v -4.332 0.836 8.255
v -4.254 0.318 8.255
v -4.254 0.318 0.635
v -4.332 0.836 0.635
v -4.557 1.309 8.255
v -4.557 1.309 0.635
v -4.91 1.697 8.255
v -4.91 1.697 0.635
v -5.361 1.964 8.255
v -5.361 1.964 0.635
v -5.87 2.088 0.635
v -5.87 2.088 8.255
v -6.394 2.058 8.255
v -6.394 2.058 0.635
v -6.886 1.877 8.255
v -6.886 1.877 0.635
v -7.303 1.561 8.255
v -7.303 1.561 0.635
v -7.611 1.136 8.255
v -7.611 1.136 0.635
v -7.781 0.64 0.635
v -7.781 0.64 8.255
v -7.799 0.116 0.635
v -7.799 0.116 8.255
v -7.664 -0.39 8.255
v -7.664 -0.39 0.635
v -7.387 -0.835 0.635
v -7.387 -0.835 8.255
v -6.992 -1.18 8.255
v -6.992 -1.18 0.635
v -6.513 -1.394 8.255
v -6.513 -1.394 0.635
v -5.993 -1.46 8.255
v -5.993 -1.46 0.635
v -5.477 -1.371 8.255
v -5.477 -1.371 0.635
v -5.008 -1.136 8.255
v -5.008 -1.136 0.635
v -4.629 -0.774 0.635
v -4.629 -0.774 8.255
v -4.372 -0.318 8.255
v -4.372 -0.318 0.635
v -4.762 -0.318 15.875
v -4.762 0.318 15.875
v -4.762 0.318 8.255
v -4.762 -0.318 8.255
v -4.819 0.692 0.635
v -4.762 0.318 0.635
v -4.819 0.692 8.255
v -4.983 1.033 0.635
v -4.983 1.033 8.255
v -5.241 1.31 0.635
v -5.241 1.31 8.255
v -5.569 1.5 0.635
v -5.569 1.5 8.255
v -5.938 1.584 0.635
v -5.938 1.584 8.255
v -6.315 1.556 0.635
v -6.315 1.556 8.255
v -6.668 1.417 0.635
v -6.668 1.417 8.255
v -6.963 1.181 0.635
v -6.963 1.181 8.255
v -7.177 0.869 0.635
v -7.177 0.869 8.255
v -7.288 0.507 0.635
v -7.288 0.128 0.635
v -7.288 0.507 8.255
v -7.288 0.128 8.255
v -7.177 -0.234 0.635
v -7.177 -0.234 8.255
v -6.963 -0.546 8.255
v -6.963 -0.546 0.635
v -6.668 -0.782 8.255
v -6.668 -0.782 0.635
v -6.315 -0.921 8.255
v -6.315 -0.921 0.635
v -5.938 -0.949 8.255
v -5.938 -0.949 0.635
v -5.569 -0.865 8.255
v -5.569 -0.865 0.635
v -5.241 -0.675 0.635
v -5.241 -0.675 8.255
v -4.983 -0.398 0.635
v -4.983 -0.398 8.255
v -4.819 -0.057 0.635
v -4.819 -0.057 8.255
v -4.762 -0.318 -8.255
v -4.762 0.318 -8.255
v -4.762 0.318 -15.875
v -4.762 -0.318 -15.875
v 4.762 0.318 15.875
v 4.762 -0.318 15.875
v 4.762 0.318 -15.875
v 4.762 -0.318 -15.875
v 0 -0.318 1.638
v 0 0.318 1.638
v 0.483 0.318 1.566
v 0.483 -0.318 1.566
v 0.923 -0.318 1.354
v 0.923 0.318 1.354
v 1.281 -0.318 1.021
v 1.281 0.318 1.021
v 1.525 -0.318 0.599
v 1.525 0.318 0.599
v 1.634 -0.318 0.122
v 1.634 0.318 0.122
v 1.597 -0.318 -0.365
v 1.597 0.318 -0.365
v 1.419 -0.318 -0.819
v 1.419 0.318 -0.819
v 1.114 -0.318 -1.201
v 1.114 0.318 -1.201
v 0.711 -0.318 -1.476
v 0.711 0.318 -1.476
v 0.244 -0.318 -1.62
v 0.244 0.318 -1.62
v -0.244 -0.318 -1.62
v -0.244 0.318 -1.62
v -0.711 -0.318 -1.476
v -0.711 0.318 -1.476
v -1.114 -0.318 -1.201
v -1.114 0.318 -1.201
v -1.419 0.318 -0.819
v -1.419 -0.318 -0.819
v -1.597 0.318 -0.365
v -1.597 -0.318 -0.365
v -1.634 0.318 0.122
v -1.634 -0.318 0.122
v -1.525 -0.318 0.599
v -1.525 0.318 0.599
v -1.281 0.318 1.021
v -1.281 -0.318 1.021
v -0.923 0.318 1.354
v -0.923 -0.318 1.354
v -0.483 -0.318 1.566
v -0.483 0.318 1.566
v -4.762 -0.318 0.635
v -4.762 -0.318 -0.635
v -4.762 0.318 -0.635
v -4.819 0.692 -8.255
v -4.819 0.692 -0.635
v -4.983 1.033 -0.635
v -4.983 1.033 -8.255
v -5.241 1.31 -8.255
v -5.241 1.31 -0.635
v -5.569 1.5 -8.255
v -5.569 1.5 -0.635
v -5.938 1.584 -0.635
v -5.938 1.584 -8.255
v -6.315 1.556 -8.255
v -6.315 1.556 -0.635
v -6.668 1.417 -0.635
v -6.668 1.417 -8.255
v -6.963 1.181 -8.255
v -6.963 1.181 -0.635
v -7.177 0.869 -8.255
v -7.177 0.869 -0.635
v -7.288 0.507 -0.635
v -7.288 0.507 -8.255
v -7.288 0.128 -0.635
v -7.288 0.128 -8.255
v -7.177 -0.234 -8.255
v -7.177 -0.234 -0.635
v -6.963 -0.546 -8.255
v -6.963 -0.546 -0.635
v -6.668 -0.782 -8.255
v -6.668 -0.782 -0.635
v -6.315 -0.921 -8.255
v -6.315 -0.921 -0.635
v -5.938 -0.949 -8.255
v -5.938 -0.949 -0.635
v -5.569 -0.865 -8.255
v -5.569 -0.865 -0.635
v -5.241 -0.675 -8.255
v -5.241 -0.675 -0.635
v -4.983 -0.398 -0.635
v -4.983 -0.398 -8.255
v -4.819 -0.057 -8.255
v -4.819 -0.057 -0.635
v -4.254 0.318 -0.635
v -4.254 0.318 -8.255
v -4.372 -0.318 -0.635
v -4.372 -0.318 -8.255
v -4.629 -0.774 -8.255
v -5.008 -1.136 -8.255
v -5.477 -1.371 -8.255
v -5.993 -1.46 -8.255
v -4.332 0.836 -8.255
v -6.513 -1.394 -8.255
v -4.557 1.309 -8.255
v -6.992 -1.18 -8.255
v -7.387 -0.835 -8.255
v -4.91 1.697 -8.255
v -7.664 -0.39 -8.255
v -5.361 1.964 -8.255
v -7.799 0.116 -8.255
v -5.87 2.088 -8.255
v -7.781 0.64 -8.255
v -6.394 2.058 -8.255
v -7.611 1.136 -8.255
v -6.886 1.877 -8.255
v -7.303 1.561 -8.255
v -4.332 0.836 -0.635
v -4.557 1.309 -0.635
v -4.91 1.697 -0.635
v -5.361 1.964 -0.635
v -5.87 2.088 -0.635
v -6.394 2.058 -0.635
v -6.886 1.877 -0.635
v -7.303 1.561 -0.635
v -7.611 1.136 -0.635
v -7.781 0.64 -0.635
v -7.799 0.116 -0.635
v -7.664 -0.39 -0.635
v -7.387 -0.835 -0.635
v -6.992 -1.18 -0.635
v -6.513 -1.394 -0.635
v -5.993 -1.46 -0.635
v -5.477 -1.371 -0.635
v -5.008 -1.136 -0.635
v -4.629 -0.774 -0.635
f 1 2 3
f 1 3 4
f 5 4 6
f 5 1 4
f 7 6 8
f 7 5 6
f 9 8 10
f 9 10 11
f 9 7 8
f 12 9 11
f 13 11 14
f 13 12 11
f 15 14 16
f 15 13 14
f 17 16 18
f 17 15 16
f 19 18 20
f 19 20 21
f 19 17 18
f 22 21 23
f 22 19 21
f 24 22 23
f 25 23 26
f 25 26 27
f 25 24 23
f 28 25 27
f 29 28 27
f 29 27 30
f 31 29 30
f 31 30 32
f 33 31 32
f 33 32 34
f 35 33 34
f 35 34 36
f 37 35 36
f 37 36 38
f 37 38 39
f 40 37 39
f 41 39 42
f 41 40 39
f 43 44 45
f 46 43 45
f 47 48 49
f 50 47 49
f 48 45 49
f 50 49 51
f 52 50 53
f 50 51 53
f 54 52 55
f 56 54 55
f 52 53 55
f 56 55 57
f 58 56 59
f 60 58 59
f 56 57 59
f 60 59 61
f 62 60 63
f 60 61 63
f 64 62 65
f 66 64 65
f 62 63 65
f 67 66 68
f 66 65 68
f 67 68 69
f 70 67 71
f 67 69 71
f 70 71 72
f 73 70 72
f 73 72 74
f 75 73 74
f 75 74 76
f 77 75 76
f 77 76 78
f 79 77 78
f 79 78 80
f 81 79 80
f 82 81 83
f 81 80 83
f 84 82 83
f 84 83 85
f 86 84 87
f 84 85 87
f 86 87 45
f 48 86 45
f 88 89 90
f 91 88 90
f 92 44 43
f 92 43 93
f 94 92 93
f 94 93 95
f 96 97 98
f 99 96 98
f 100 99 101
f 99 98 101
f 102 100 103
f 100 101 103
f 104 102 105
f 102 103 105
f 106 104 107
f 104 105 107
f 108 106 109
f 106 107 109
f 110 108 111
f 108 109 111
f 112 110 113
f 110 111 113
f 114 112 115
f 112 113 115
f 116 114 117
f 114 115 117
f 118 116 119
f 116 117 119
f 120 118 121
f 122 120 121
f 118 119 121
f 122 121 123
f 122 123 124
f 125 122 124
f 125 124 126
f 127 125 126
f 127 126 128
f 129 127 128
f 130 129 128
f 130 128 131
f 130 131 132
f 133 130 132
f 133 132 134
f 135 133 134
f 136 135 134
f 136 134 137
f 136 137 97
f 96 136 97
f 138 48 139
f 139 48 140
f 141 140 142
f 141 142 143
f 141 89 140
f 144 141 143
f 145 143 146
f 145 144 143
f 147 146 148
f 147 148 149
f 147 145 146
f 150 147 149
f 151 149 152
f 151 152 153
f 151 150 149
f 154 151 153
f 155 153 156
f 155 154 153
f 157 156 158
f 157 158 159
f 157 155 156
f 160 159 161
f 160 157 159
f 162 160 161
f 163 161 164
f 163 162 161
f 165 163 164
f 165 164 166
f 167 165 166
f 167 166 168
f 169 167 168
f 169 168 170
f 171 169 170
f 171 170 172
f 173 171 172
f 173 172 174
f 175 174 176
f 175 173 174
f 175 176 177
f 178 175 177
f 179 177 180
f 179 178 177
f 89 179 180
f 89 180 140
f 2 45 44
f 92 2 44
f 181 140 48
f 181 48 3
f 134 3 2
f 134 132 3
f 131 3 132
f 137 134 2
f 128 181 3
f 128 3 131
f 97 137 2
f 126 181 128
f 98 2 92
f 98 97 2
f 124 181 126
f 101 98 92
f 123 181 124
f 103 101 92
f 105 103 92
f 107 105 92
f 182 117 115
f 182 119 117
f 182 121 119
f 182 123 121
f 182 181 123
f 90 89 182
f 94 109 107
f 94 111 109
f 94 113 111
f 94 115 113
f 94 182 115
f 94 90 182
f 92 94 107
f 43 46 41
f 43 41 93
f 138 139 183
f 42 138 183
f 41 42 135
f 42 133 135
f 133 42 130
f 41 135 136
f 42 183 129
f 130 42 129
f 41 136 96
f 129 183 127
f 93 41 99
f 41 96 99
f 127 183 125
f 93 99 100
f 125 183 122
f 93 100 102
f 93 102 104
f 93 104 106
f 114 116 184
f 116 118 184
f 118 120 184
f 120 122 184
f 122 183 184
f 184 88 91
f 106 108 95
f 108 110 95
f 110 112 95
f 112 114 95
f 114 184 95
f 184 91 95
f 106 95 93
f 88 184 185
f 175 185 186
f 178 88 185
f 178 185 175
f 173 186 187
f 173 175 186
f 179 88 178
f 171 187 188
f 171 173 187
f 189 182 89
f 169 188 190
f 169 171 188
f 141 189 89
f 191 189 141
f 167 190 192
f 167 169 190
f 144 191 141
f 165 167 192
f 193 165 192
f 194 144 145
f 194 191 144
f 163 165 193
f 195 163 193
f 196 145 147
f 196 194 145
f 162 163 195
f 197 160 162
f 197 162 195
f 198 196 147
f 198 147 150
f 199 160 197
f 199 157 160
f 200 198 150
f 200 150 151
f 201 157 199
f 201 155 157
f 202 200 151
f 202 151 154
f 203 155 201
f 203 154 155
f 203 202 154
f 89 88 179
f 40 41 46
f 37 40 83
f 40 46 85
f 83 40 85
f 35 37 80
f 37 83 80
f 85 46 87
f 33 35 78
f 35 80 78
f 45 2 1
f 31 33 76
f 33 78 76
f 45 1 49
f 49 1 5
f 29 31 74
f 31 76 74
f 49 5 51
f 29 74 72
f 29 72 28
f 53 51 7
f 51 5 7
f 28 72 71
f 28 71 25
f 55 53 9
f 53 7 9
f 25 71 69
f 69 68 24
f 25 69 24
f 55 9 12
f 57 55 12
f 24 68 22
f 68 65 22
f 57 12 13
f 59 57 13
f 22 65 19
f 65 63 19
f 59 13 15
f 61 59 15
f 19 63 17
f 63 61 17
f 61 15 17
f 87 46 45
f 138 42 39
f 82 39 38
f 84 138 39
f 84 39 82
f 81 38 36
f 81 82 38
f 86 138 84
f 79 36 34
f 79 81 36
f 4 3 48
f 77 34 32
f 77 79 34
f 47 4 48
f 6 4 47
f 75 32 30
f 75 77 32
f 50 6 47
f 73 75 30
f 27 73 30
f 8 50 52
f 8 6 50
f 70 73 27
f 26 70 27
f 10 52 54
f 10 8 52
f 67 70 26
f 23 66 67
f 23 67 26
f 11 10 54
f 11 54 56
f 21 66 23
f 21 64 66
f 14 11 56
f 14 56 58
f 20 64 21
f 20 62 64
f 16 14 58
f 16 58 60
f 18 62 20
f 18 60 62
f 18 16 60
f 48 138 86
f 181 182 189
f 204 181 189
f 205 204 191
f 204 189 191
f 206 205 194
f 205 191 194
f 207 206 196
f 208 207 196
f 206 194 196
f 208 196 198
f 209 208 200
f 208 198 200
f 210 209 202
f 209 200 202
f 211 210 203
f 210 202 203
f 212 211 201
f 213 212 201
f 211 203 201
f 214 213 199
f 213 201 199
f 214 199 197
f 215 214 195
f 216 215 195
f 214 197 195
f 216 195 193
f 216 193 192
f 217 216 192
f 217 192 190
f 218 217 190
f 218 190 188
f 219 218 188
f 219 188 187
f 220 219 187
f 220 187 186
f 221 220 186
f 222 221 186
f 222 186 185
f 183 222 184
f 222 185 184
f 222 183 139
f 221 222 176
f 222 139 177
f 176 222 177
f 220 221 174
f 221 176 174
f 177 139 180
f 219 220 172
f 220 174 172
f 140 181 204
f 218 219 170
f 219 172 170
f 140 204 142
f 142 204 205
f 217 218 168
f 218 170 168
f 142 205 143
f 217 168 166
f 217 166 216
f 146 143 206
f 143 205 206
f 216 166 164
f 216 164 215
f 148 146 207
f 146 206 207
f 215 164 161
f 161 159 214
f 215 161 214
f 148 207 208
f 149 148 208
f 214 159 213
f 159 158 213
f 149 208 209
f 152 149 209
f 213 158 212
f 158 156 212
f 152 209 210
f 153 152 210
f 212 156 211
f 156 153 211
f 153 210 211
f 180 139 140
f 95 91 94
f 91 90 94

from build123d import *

# Parameters (mm, degrees)
SKETCH1_W           = 9.525
SKETCH1_H           = 31.75
BOSS_EXTRUDE1_DEPTH = 0.3175
SKETCH5_W           = 0.508
SKETCH5_H           = 7.62
SKETCH6_R           = 1.6383
CUT_EXTRUDE1_DEPTH  = 12.7


with BuildPart() as part:
    # Sketch1 → Boss-Extrude1 (new, symmetric)
    with BuildSketch(Plane(origin=(0, 0, 0), x_dir=(1, 0, 0), z_dir=(0, 1, 0))):
        Rectangle(SKETCH1_W, SKETCH1_H)
    extrude(amount=BOSS_EXTRUDE1_DEPTH, both=True)

    # Sketch5 → Revolve3 (revolve)
    with BuildSketch(Plane(origin=(0, 0.3175, 0), x_dir=(1, 0, 0), z_dir=(0, 1, 0))):
        with Locations((-4.5085, 4.445)):
            Rectangle(SKETCH5_W, SKETCH5_H)
    revolve3 = revolve(axis=Axis((-6.0325, 0.3175, -15.875), (0, 0, 1)))

    # Mirror2: Revolve3 across plane
    add(revolve3.mirror(Plane.XY))

    # Sketch6 → Cut-Extrude1 (cut)
    with BuildSketch(Plane(origin=(0, 0.3175, 0), x_dir=(1, 0, 0), z_dir=(0, 1, 0))):
        with Locations(Location((0, 0, 0), (0, 0, 270))):
            Circle(SKETCH6_R)
    extrude(amount=-CUT_EXTRUDE1_DEPTH, mode=Mode.SUBTRACT)


solid = part.part
